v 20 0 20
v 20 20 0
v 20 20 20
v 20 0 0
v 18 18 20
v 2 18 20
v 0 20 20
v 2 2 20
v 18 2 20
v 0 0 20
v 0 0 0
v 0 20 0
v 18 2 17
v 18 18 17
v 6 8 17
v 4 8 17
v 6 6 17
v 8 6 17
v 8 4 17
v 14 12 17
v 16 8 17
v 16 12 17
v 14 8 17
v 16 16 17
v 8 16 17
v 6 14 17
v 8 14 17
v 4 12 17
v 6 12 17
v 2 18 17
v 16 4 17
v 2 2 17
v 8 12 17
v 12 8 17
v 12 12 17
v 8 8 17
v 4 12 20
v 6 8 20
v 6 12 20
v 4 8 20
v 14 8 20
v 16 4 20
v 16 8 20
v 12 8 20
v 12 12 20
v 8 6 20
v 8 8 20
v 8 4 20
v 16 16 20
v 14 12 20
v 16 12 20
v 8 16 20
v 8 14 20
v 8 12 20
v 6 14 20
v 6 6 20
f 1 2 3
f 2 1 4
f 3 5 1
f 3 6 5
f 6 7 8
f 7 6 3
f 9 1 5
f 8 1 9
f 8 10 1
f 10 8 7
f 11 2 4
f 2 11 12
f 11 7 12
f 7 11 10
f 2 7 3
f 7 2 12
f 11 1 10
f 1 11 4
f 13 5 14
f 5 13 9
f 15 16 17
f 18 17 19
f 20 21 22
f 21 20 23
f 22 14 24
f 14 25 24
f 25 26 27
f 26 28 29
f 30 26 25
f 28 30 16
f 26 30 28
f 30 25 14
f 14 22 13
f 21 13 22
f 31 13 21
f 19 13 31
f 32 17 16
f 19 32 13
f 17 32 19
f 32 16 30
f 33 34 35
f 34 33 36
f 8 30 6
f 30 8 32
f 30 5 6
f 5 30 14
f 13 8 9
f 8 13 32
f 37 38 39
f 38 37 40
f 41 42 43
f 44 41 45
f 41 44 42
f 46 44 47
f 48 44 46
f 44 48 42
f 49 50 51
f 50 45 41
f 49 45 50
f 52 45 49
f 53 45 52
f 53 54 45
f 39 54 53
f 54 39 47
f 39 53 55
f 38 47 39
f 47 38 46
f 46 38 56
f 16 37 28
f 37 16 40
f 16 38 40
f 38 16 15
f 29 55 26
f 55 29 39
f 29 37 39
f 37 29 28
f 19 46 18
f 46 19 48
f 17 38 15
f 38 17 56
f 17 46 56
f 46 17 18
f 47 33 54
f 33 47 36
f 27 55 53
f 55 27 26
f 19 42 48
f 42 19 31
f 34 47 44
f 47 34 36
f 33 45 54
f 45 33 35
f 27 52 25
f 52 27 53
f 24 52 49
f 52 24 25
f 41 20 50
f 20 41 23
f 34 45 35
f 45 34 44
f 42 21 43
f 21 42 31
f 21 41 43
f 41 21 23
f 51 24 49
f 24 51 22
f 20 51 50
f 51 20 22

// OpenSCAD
/*
Parametric Alphabet Block 
Tony Buser <tbuser@gmail.com>
http://tonybuser.com
http://creativecommons.org/licenses/by/3.0/
*/

use <bitmap.scad>

// change to any letter
letter = "A";

union() {
	difference() {
		cube(size = 20);
		translate(v = [2, 2, 17]) {
			cube(size = [16, 16, 5]);
		}
	}

	translate(v = [10, 10, 15]) {
		8bit_char(letter, 2, 5);
	}
}
